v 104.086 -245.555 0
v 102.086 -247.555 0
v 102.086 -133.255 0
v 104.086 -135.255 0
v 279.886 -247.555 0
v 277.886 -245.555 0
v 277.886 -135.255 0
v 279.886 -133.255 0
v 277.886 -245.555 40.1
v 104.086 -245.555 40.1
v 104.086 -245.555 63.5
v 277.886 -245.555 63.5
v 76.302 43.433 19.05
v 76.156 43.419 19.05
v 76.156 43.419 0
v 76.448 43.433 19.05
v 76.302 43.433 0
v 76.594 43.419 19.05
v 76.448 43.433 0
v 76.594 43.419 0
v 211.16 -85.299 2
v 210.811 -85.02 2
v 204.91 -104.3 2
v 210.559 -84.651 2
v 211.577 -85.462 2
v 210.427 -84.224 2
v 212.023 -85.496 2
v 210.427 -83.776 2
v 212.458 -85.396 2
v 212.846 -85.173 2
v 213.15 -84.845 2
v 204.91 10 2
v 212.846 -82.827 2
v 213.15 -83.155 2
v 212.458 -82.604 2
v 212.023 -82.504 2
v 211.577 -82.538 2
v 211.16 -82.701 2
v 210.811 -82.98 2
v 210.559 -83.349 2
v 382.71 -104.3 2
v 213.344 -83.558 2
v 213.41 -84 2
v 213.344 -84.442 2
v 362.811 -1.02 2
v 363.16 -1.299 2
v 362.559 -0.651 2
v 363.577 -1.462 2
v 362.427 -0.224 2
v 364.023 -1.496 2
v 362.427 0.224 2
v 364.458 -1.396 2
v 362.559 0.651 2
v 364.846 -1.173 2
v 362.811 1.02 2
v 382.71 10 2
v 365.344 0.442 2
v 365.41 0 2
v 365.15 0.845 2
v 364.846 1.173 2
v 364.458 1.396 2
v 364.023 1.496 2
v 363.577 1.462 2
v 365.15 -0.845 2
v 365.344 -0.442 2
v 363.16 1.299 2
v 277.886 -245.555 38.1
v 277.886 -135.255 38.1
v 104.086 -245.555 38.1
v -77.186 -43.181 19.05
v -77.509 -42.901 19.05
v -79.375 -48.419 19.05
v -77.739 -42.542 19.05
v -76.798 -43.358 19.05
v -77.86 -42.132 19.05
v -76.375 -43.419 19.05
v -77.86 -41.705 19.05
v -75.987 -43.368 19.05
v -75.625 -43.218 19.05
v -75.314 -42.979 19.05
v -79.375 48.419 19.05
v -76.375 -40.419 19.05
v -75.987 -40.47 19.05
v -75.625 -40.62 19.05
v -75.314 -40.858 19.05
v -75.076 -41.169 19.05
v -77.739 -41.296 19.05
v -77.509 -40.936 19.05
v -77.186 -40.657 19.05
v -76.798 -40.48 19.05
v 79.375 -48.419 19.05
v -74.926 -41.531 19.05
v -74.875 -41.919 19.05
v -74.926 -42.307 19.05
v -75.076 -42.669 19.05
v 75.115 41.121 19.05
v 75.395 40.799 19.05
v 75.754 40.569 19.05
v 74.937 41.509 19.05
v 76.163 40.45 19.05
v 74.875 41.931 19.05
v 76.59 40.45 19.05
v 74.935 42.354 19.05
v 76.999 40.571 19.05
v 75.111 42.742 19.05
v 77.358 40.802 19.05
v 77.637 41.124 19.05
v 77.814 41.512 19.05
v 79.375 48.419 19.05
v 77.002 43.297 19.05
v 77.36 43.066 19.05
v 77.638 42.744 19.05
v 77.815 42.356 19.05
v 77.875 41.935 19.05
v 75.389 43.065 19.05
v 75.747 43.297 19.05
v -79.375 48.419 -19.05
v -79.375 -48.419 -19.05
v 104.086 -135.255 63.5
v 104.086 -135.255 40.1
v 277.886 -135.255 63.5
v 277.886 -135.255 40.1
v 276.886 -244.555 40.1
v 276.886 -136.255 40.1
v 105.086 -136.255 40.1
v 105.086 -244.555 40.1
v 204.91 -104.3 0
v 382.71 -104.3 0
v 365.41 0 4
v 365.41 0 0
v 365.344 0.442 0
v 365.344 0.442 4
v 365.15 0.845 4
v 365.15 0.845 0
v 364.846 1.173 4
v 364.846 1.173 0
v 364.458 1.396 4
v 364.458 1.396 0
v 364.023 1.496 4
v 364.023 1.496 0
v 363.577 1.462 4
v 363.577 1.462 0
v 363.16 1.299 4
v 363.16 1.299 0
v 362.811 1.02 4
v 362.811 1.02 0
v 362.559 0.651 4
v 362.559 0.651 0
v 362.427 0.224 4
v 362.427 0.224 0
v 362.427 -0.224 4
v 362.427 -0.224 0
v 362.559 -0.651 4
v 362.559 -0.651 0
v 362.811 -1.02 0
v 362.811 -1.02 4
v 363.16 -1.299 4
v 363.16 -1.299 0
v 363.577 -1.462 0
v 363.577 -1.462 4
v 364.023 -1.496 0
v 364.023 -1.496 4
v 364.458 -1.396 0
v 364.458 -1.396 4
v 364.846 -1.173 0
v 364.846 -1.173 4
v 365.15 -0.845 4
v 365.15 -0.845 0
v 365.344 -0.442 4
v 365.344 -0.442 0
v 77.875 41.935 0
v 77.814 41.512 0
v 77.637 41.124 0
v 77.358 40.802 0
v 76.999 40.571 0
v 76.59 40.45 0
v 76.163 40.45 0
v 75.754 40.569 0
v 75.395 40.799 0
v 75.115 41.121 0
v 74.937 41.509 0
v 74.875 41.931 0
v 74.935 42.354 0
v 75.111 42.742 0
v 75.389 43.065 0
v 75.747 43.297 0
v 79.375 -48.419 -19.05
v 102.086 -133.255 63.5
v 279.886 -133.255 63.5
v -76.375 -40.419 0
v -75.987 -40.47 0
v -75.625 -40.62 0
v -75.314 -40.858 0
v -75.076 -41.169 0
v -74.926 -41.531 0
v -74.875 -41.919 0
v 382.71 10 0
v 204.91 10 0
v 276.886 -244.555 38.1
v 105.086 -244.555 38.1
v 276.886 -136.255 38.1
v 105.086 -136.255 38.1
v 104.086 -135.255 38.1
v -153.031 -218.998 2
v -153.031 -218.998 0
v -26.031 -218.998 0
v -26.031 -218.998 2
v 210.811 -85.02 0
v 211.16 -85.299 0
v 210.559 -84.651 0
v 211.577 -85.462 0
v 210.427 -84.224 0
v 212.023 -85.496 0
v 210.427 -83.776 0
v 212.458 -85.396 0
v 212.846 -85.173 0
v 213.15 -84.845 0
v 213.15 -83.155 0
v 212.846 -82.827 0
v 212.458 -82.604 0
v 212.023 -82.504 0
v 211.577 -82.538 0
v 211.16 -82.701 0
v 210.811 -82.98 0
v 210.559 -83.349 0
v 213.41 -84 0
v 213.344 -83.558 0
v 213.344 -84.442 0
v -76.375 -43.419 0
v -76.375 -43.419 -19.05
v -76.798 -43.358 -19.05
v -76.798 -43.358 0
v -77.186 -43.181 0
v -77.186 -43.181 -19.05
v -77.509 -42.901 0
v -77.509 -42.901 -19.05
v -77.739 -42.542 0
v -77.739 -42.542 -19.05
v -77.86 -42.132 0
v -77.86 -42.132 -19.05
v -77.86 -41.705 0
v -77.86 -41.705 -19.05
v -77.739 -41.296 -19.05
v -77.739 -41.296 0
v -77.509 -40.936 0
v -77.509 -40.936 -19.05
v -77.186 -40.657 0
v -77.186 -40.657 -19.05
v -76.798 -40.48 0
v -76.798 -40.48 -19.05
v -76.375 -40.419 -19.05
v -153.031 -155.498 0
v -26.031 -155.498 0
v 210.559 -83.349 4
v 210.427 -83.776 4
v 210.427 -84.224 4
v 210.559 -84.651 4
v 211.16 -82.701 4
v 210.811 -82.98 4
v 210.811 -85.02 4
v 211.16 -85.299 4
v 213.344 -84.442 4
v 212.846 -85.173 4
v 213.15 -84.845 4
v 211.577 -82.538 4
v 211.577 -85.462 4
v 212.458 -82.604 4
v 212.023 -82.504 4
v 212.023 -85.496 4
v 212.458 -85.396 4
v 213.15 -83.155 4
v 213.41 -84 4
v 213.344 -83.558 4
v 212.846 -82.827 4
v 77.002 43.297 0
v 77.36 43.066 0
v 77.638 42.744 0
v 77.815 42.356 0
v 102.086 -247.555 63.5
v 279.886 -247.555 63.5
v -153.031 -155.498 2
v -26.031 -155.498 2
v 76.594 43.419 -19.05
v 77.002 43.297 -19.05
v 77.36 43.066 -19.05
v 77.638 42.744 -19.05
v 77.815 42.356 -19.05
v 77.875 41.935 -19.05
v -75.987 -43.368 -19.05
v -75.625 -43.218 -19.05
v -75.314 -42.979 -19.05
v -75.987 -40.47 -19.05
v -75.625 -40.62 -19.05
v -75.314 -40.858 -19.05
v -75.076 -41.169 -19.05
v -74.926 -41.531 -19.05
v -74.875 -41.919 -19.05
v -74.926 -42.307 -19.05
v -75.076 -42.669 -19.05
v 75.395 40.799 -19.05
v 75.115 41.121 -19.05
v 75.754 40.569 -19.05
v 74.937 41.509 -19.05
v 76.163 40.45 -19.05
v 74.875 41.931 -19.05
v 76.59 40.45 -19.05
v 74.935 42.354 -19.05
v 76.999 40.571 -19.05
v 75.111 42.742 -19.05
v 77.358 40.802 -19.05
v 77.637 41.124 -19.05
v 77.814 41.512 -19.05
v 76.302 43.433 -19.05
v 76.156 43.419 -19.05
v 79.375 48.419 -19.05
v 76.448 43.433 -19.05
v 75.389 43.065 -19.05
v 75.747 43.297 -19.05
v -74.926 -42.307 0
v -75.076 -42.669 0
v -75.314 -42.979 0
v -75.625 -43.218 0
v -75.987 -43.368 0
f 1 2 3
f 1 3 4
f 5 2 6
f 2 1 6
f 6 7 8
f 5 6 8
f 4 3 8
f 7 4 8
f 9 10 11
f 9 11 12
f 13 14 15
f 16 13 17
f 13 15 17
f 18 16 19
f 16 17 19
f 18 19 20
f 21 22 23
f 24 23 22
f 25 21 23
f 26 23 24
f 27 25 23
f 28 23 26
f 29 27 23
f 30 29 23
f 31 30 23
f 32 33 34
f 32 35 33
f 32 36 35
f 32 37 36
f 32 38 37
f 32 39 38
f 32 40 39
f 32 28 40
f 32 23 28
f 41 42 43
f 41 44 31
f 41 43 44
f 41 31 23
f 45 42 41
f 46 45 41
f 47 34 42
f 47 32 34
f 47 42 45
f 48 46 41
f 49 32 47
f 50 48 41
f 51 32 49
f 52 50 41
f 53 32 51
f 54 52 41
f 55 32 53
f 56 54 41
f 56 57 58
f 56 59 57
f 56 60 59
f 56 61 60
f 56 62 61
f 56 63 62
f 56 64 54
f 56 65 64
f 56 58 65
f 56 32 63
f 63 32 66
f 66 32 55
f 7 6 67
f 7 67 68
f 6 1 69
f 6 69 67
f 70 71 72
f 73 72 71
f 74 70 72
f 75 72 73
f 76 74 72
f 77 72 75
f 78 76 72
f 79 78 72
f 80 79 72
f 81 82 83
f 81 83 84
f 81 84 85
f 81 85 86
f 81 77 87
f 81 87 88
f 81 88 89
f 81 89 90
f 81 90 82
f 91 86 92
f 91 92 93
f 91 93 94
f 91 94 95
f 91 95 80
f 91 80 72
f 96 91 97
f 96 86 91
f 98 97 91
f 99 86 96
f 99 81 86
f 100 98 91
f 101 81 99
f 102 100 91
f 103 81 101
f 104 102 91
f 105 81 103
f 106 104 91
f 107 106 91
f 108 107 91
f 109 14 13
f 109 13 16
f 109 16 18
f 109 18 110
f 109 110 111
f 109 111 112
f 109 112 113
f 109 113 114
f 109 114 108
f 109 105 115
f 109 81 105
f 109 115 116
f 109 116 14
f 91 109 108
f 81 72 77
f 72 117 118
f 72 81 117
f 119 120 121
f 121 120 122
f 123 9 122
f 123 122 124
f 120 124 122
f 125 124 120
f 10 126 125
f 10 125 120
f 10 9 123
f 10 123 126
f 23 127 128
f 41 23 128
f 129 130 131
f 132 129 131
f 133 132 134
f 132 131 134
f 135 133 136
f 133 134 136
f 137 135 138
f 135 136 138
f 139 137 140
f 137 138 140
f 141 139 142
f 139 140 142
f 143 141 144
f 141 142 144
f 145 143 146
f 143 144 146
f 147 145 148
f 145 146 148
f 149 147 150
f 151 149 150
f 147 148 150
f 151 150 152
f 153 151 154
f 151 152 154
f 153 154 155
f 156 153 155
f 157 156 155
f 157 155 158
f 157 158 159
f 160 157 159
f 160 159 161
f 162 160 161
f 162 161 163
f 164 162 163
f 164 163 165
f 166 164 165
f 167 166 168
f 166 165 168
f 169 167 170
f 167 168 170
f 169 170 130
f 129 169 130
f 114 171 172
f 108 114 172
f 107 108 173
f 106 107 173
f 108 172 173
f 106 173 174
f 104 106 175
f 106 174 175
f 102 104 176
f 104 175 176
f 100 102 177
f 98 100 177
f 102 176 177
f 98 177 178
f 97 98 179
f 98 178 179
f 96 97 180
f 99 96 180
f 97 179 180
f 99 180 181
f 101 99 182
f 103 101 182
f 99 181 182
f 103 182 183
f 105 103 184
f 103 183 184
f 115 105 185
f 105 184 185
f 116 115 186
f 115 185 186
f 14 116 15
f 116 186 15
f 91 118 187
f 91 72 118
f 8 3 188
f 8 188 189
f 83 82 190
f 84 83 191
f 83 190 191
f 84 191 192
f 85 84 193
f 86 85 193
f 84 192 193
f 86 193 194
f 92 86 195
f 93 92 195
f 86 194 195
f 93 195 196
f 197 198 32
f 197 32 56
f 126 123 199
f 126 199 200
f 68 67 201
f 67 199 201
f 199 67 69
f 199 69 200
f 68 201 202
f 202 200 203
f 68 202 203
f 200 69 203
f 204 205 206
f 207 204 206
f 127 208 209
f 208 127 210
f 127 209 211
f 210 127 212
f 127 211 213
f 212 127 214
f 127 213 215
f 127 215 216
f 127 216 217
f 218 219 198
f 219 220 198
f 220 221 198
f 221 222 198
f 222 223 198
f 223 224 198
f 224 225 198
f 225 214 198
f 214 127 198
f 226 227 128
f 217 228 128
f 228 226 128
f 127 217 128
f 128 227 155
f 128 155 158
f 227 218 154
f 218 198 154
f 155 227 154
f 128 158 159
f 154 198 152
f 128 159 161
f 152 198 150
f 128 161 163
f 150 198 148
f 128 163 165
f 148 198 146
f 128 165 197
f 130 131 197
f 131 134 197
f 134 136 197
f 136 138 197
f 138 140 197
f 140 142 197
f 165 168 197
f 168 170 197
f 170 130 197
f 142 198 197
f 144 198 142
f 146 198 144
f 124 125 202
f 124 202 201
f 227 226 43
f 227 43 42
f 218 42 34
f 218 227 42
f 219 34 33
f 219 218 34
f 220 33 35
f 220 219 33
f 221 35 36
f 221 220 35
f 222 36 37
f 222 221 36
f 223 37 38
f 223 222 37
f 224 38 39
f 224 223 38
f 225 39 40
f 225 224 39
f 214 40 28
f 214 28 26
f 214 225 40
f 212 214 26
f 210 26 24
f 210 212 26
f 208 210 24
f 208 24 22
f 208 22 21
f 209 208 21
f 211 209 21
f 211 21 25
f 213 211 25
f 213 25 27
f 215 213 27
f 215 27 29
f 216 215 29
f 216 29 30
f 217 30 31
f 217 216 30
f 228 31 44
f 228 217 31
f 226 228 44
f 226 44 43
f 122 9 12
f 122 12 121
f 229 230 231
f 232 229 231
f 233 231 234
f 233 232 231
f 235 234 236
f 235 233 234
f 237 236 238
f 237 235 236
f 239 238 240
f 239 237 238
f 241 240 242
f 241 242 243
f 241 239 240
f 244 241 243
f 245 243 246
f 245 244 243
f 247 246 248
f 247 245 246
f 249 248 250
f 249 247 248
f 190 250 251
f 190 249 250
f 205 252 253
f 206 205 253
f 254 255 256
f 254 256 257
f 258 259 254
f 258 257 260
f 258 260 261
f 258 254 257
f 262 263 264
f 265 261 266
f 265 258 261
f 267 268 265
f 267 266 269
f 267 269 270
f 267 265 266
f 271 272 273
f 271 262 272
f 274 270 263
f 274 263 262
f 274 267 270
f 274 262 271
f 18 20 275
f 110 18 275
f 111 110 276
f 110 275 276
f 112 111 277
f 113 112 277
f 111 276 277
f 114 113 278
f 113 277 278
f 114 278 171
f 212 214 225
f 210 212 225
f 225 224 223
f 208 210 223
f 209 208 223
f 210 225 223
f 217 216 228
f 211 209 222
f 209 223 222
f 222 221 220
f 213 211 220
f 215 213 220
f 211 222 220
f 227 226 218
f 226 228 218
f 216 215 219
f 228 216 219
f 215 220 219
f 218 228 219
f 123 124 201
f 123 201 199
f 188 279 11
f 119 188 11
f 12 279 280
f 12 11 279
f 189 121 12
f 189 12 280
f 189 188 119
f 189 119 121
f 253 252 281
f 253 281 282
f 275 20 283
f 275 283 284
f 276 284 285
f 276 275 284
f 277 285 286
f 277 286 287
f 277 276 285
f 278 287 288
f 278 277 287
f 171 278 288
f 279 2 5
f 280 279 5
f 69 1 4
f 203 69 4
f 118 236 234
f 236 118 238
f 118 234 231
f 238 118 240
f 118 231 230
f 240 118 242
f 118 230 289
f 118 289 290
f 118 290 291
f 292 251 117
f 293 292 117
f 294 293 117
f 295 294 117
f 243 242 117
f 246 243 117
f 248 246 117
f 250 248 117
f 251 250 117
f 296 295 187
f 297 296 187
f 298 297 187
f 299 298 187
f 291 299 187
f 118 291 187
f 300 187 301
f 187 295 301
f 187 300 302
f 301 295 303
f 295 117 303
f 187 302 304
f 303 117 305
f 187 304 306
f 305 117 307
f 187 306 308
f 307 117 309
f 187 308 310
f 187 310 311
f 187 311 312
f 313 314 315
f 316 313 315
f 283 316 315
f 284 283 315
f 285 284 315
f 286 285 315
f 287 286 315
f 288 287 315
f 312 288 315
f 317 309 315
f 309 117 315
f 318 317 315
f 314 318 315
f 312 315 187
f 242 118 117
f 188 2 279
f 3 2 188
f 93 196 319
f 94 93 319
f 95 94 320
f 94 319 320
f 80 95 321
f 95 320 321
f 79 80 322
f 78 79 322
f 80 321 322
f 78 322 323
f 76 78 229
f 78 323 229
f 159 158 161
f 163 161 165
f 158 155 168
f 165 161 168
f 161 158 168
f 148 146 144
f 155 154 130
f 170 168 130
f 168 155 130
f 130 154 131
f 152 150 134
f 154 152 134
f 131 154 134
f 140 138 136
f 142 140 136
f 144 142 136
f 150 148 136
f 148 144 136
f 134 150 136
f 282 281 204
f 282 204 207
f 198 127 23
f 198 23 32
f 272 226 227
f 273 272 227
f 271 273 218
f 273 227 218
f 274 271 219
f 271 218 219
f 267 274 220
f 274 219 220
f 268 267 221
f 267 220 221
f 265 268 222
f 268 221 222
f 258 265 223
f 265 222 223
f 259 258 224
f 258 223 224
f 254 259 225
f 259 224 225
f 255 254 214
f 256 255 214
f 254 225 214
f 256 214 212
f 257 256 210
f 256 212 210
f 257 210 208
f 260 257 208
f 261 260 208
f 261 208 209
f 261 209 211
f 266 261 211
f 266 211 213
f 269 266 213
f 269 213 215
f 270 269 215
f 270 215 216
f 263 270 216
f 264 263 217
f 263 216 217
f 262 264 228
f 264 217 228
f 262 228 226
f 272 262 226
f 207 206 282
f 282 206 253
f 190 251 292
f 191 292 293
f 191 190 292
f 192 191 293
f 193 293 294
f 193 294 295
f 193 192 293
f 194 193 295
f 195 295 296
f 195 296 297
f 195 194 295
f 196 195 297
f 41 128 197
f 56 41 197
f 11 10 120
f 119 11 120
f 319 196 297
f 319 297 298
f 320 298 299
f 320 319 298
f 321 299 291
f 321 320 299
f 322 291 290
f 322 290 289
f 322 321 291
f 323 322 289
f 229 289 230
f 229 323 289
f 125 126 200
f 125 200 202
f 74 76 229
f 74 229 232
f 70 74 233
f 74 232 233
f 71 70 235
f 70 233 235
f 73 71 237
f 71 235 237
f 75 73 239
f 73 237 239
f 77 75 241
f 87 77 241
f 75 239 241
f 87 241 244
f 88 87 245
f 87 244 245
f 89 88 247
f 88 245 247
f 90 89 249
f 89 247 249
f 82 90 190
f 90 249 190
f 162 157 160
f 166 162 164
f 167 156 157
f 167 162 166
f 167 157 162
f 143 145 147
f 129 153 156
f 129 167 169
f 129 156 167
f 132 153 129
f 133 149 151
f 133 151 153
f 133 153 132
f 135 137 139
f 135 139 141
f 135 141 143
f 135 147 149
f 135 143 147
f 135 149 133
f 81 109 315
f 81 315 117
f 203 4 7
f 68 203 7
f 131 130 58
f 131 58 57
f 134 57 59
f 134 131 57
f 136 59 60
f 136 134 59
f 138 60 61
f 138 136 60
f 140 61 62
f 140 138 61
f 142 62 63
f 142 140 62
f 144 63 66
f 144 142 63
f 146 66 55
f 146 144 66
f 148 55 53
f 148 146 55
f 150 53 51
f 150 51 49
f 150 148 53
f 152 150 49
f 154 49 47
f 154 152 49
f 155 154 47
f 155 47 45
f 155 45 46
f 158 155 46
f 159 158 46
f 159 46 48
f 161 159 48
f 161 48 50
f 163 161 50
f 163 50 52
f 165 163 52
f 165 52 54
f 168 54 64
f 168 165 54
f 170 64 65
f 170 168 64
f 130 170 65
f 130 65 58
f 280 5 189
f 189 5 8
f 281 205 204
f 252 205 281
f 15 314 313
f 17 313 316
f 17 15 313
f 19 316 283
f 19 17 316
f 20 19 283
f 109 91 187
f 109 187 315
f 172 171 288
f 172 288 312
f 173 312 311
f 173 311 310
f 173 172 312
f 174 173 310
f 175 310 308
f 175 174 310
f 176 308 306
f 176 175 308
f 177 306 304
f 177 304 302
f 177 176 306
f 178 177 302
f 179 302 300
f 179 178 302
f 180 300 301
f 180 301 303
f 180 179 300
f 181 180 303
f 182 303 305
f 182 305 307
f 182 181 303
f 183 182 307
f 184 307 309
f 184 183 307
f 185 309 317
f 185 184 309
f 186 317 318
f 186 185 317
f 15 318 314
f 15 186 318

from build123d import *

# Parameters (mm, degrees)
F1_DEPTH  = 19.05
F2_R      = 1.5
F3_DEPTH  = 4
F2_W      = 177.8
F2_H      = 114.3
F4_DEPTH  = 2
F6_W      = 177.8
F6_H      = 114.3
F6_W_2    = 173.8
F6_H_2    = 110.3
F7_DEPTH  = 63.5
F10_W     = 173.8
F10_H     = 2
F12_DEPTH = 1
F11_W     = 110.3
F11_H     = 2
F13_DEPTH = 1
F9_W      = 110.3
F9_H      = 2
F14_DEPTH = 1
F8_W      = 173.8
F8_H      = 2
F15_DEPTH = 1
F5_W      = 127
F5_H      = 63.5
F16_DEPTH = 2


with BuildPart() as f1:
    # F0 (on Top) → F1 (new body, symmetric)
    with BuildSketch(Plane.XY):
        with BuildLine():
            Line((-79.375, -48.41875), (79.375, -48.41875))
            Line((79.375, -48.41875), (79.375, 40.41875))
            Line((79.375, 40.41875), (73.375, 40.41875))
            Line((73.375, 40.41875), (73.375, 43.41875))
            Line((73.375, 43.41875), (76.1563882031, 43.41875))
            ThreePointArc((76.1563882031, 43.41875), (76.375, 43.4347658753), (76.5936117969, 43.41875))
            Line((76.5936117969, 43.41875), (79.375, 43.41875))
            Line((79.375, 43.41875), (79.375, 48.41875))
            Line((79.375, 48.41875), (-79.375, 48.41875))
            Line((-79.375, 48.41875), (-79.375, -40.41875))
            Line((-79.375, -40.41875), (-76.375, -40.41875))
            Line((-76.375, -40.41875), (-73.375, -40.41875))
            Line((-73.375, -40.41875), (-73.375, -43.41875))
            Line((-73.375, -43.41875), (-76.375, -43.41875))
            Line((-76.375, -43.41875), (-79.375, -43.41875))
            Line((-79.375, -43.41875), (-79.375, -48.41875))
        make_face()
        with BuildLine():
            ThreePointArc((-74.875, -41.91875), (-75.3143398282, -42.9794101718), (-76.375, -43.41875))
            Line((-76.375, -43.41875), (-73.375, -43.41875))
            Line((-73.375, -43.41875), (-73.375, -40.41875))
            Line((-73.375, -40.41875), (-76.375, -40.41875))
            ThreePointArc((-76.375, -40.41875), (-75.3143398282, -40.8580898282), (-74.875, -41.91875))
        make_face()
        with BuildLine():
            Line((-79.375, -40.41875), (-79.375, -43.41875))
            Line((-79.375, -43.41875), (-76.375, -43.41875))
            ThreePointArc((-76.375, -43.41875), (-77.875, -41.91875), (-76.375, -40.41875))
            Line((-76.375, -40.41875), (-79.375, -40.41875))
        make_face()
        with BuildLine():
            Line((73.375, 40.41875), (79.375, 40.41875))
            Line((79.375, 40.41875), (79.375, 43.41875))
            Line((79.375, 43.41875), (76.5936117969, 43.41875))
            ThreePointArc((76.5936117969, 43.41875), (77.5103232349, 42.9150929393), (77.875, 41.9347658753))
            ThreePointArc((77.875, 41.9347658753), (75.3946729361, 40.7994426404), (76.1563882031, 43.41875))
            Line((76.1563882031, 43.41875), (73.375, 43.41875))
            Line((73.375, 43.41875), (73.375, 40.41875))
        make_face()
    extrude(amount=F1_DEPTH, both=True)


with BuildPart() as f3:
    # F2 (on Top) → F3 (new body)
    with BuildSketch(Plane.XY):
        with Locations((211.9104366302, -84)):
            Circle(F2_R)
    extrude(amount=F3_DEPTH)


with BuildPart() as f3b:
    # F2 (on Top) → F3, piece 2 (new body)
    with BuildSketch(Plane.XY):
        with Locations((363.9104366302, 0)):
            Circle(F2_R)
    extrude(amount=F3_DEPTH)


with BuildPart() as f4:
    # F2 (on Top) → F4 (new body)
    with BuildSketch(Plane.XY):
        with Locations((293.8104366302, -47.15)):
            Rectangle(F2_W, F2_H)
        with Locations((211.9104366302, -84)):
            Circle(F2_R, mode=Mode.SUBTRACT)
        with Locations((363.9104366302, 0)):
            Circle(F2_R, mode=Mode.SUBTRACT)
    extrude(amount=F4_DEPTH)


with BuildPart() as f7:
    # F6 (on Top) → F7 (new body)
    with BuildSketch(Plane.XY):
        with Locations((190.9857392311, -190.4046696647)):
            Rectangle(F6_W, F6_H)
        with Locations((190.9857392311, -190.4046696647)):
            Rectangle(F6_W_2, F6_H_2, mode=Mode.SUBTRACT)
    extrude(amount=F7_DEPTH)

    # F10 (on face) → F12 (join)
    with BuildSketch(Plane.XZ.offset(135.2546696647)):
        with Locations((190.9857392311, 39.1)):
            Rectangle(F10_W, F10_H)
    extrude(amount=F12_DEPTH)

    # F11 (on face) → F13 (join)
    with BuildSketch(Plane(origin=(277.8857392311, 0, 0), x_dir=(0, -1, 0), z_dir=(-1, 0, 0))):
        with Locations((190.4046696647, 39.1)):
            Rectangle(F11_W, F11_H)
    extrude(amount=F13_DEPTH)

    # F9 (on face) → F14 (join)
    with BuildSketch(Plane.YZ.offset(104.0857392311)):
        with Locations((-190.4046696647, 39.1)):
            Rectangle(F9_W, F9_H)
    extrude(amount=F14_DEPTH)

    # F8 (on face) → F15 (join)
    with BuildSketch(Plane(origin=(0, -245.5546696647, 0), x_dir=(-1, 0, 0), z_dir=(0, 1, 0))):
        with Locations((-190.9857392311, 39.1)):
            Rectangle(F8_W, F8_H)
    extrude(amount=F15_DEPTH)


with BuildPart() as f16:
    # F5 (on Top) → F16 (new body)
    with BuildSketch(Plane.XY):
        with Locations((-89.5311820786, -187.2475810379)):
            Rectangle(F5_W, F5_H)
    extrude(amount=F16_DEPTH)


solid = Compound([f1.part, f3.part, f3b.part, f4.part, f7.part, f16.part])
